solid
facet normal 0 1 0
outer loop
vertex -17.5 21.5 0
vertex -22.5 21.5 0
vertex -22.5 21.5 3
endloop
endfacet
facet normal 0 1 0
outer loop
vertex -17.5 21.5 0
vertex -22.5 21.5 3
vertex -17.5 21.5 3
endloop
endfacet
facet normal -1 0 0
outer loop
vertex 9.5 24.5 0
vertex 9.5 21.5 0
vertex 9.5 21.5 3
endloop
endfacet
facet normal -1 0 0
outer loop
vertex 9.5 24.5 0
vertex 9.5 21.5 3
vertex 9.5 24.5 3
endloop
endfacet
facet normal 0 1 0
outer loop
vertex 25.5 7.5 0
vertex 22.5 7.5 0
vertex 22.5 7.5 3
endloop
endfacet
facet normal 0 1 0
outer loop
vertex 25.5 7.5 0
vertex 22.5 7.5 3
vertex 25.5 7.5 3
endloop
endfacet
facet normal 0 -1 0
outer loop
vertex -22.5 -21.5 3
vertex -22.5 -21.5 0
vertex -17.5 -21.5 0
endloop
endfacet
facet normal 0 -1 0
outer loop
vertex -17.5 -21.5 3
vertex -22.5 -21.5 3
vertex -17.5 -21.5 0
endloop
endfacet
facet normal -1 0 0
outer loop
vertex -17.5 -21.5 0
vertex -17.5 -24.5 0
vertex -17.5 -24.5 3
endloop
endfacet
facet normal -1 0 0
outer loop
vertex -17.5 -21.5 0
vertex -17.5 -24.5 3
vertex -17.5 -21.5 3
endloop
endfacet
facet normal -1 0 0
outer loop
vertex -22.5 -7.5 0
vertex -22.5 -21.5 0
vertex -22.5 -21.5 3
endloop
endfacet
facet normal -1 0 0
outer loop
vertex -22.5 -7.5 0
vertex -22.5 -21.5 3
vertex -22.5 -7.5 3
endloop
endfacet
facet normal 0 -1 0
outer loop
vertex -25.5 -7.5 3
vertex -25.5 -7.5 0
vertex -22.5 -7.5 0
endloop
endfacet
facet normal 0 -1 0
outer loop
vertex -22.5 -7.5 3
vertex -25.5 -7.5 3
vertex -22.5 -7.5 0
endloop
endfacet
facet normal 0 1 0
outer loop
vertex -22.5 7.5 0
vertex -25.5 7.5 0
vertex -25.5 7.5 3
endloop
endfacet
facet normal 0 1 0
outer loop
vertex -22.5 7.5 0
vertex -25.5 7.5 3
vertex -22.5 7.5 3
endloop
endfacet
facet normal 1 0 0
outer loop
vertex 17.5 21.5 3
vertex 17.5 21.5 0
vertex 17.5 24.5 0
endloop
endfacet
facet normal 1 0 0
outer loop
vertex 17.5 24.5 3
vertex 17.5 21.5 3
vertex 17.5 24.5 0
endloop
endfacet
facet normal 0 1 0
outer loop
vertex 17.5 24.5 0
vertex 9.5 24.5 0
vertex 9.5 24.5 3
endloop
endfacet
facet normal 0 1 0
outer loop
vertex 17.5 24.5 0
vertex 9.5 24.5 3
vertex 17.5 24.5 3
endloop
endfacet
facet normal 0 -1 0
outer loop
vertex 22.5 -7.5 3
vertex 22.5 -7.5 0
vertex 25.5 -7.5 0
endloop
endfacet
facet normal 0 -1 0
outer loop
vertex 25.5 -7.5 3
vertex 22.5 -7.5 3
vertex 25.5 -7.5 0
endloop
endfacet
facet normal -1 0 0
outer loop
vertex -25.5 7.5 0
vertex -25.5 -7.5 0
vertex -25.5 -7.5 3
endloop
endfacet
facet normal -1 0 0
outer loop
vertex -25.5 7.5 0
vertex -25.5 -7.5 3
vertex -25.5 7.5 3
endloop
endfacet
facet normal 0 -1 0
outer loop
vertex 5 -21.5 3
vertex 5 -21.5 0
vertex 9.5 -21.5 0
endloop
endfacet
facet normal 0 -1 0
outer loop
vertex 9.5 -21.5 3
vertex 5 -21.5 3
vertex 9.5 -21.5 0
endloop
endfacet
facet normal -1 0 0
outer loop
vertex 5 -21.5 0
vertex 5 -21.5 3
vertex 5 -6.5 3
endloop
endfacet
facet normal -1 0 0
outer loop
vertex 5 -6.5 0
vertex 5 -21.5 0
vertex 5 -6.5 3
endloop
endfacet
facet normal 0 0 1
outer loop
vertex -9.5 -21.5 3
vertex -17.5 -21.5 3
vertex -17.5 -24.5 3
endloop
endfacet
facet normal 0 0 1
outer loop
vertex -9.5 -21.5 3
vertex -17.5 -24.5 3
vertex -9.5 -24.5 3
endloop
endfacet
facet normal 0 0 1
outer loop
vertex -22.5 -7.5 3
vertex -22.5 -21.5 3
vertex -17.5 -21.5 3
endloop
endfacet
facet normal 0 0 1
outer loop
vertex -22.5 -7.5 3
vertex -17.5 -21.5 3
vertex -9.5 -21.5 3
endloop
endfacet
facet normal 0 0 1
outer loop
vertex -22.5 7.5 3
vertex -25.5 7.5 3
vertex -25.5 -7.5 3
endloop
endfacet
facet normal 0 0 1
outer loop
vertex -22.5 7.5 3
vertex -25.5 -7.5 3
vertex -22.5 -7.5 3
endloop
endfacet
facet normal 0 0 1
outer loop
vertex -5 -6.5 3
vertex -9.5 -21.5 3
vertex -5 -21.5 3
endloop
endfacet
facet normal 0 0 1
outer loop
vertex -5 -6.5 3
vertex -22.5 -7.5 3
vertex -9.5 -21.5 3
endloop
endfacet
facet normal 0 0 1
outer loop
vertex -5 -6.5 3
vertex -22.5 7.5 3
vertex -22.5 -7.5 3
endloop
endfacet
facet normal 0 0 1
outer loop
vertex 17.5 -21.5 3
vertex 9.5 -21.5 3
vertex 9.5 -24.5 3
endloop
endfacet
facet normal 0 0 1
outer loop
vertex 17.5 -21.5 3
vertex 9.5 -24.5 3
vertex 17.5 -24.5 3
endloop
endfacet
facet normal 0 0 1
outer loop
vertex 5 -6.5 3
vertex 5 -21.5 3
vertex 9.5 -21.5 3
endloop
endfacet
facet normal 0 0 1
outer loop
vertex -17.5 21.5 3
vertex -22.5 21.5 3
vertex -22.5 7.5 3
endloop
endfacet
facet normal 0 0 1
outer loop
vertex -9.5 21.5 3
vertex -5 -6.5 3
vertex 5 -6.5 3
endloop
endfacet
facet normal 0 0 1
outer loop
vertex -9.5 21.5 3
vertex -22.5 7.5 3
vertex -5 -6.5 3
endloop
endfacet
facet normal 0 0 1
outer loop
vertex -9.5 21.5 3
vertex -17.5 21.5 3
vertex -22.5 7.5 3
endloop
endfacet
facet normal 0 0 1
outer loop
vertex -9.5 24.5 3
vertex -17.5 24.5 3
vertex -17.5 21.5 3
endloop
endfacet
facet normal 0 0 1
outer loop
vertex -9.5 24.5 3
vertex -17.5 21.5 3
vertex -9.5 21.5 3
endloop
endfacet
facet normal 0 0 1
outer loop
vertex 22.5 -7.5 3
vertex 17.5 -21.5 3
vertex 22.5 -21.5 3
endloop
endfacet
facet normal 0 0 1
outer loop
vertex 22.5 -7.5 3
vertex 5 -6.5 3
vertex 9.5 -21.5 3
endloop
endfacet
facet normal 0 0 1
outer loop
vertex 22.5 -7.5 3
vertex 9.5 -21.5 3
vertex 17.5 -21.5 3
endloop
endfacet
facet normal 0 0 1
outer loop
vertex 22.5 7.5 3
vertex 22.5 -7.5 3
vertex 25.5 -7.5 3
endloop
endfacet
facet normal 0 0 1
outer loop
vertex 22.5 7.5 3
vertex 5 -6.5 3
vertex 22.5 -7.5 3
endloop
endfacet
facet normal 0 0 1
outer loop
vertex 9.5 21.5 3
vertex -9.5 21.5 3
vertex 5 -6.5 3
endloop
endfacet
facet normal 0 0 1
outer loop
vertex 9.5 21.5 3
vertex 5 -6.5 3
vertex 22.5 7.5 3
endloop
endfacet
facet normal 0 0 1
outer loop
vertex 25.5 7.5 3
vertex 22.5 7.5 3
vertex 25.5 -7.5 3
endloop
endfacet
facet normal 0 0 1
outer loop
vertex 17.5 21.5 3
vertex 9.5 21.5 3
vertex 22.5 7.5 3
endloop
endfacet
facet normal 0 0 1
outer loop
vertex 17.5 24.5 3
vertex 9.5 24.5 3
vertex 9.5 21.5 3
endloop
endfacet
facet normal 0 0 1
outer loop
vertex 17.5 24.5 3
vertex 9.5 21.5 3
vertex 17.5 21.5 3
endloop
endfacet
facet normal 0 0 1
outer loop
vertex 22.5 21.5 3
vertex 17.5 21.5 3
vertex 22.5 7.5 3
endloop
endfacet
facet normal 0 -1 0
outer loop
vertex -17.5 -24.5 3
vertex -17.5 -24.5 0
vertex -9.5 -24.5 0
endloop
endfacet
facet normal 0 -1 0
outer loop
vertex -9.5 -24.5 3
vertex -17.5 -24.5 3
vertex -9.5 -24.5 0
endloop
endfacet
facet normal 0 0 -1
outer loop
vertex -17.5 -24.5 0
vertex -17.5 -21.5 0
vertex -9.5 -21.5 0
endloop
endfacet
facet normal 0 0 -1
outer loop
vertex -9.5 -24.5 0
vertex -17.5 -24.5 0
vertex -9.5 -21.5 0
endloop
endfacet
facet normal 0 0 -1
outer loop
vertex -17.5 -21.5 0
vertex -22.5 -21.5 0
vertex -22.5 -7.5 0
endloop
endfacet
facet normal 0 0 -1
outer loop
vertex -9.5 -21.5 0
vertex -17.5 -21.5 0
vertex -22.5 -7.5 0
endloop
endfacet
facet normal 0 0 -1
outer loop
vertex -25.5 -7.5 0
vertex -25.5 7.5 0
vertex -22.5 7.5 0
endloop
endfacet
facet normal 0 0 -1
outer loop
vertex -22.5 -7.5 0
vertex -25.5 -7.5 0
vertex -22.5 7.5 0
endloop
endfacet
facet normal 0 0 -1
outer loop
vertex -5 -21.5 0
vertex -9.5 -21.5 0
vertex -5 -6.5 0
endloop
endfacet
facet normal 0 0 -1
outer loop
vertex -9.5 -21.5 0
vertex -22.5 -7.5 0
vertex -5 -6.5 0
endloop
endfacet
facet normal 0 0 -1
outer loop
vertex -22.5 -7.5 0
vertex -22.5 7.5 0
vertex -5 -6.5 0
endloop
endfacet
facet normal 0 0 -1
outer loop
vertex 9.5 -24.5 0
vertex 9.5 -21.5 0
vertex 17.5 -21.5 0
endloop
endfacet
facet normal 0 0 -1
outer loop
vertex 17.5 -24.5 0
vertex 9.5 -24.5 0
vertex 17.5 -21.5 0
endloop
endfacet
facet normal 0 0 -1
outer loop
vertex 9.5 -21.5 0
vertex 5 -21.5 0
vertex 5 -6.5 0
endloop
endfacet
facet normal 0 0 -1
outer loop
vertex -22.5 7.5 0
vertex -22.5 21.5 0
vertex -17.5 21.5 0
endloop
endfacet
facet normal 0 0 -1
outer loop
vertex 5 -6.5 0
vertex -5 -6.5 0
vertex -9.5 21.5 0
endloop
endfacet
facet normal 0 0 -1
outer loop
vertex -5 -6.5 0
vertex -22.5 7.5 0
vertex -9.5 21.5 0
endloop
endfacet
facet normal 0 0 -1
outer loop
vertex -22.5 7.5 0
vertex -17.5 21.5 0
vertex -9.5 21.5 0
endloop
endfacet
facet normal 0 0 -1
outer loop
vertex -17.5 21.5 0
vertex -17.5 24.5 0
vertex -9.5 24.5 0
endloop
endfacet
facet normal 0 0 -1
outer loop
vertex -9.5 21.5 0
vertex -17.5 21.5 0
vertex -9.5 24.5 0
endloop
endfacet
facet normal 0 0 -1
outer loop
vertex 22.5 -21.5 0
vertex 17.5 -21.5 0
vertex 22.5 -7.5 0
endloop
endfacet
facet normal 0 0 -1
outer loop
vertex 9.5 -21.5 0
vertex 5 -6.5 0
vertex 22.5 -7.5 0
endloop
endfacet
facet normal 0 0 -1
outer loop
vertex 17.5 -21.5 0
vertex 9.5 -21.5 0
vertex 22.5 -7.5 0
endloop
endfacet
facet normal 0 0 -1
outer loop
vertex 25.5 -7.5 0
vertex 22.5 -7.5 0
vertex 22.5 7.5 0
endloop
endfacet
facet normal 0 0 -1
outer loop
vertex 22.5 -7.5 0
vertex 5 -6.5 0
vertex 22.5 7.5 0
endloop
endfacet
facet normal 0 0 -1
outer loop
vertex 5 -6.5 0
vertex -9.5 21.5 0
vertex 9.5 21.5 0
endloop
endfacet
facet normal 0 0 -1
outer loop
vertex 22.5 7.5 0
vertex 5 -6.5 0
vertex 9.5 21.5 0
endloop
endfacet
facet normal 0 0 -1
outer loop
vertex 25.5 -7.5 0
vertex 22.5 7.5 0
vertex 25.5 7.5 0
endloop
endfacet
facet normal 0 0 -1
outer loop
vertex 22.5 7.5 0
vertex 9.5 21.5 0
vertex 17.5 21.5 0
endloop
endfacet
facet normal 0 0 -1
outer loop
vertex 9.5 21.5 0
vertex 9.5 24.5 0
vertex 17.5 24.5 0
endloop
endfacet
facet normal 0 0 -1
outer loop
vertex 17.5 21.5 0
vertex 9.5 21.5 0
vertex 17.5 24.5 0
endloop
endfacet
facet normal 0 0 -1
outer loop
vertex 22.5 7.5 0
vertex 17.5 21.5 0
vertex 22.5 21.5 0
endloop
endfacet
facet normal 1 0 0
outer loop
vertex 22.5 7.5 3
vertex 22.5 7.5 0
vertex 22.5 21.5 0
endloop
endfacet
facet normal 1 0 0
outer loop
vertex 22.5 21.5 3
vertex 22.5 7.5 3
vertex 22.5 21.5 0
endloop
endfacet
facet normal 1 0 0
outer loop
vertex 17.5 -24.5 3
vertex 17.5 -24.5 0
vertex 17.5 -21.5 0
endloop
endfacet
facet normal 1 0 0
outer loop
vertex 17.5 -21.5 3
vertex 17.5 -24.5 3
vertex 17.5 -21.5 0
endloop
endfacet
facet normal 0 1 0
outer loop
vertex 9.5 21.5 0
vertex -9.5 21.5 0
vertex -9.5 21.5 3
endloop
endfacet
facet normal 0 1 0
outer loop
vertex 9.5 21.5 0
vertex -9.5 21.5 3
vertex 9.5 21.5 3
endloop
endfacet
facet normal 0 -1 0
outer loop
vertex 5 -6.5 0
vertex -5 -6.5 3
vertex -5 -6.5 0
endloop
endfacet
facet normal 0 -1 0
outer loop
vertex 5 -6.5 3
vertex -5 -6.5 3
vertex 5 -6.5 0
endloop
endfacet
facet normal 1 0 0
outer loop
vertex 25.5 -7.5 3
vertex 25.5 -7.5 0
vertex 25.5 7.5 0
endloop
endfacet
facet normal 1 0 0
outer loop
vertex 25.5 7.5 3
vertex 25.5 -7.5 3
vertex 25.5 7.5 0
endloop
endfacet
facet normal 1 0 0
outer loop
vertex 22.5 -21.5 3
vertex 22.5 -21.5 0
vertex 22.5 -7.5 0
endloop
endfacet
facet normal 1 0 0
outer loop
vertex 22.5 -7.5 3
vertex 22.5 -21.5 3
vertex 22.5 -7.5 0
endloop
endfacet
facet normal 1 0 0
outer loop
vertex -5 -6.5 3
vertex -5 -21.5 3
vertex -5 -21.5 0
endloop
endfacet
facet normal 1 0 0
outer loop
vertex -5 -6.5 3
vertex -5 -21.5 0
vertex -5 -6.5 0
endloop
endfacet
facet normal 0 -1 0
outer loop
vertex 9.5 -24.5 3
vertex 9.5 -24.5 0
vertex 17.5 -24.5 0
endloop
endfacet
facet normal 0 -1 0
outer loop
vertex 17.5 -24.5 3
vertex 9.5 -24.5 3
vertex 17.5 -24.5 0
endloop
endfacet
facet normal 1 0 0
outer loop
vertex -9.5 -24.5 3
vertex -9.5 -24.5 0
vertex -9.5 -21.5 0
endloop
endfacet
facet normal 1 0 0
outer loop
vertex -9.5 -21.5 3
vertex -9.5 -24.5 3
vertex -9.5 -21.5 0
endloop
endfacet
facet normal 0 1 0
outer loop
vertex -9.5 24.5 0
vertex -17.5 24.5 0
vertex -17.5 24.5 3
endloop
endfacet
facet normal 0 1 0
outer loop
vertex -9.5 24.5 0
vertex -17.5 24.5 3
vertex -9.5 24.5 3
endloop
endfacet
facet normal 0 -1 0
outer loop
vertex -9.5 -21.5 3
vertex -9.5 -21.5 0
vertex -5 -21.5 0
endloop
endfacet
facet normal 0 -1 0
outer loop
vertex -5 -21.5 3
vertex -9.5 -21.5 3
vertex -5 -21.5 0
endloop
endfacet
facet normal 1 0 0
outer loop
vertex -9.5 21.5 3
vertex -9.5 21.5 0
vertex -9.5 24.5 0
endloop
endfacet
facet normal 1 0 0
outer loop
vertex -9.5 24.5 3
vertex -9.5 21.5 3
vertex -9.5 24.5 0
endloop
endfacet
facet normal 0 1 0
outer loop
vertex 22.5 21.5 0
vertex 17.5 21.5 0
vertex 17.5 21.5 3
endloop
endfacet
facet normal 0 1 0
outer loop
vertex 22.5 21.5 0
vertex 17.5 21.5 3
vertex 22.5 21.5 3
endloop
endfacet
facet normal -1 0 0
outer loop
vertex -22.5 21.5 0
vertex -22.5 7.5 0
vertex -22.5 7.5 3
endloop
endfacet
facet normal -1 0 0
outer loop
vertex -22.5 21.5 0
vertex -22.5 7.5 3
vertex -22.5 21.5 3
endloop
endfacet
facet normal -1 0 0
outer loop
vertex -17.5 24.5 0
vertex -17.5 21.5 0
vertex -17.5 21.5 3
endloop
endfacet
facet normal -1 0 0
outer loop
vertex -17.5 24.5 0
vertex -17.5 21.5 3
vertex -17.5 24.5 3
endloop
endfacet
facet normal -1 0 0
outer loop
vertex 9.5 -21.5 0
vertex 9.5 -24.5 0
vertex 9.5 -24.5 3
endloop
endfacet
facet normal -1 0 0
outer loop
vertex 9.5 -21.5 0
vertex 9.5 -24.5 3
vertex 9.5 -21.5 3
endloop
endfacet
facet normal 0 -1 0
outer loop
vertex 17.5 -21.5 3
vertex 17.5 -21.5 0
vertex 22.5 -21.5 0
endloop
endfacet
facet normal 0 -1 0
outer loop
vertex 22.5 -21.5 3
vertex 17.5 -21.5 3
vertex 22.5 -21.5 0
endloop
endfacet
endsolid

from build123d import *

# Parameters (mm, degrees)
SKETCH_1_W          = 45
SKETCH_1_H          = 43
SKETCH_1_W_2        = 8
SKETCH_1_H_2        = 3
SKETCH_1_W_3        = 3
SKETCH_1_H_3        = 15
EXTRUDE_1_DEPTH     = 3
SKETCH_2_W          = 10
SKETCH_2_H          = 15
CUT_EXTRUDE_1_DEPTH = 10


with BuildPart() as part:
    # 草图1 → 凸台-拉伸1 (new body)
    with BuildSketch(Plane.XY):
        Rectangle(SKETCH_1_W, SKETCH_1_H)
        with Locations((-13.5, 23)):
            Rectangle(SKETCH_1_W_2, SKETCH_1_H_2)
        with Locations((13.5, 23)):
            Rectangle(SKETCH_1_W_2, SKETCH_1_H_2)
        with Locations((-24, 0)):
            Rectangle(SKETCH_1_W_3, SKETCH_1_H_3)
        with Locations((24, 0)):
            Rectangle(SKETCH_1_W_3, SKETCH_1_H_3)
        with Locations((-13.5, -23)):
            Rectangle(SKETCH_1_W_2, SKETCH_1_H_2)
        with Locations((13.5, -23)):
            Rectangle(SKETCH_1_W_2, SKETCH_1_H_2)
    extrude(amount=EXTRUDE_1_DEPTH)

    # 草图2 → 切除-拉伸1 (cut)
    with BuildSketch(Plane.XY.offset(3)):
        with Locations((0, -14)):
            Rectangle(SKETCH_2_W, SKETCH_2_H)
    extrude(amount=-CUT_EXTRUDE_1_DEPTH, mode=Mode.SUBTRACT)


solid = part.part
